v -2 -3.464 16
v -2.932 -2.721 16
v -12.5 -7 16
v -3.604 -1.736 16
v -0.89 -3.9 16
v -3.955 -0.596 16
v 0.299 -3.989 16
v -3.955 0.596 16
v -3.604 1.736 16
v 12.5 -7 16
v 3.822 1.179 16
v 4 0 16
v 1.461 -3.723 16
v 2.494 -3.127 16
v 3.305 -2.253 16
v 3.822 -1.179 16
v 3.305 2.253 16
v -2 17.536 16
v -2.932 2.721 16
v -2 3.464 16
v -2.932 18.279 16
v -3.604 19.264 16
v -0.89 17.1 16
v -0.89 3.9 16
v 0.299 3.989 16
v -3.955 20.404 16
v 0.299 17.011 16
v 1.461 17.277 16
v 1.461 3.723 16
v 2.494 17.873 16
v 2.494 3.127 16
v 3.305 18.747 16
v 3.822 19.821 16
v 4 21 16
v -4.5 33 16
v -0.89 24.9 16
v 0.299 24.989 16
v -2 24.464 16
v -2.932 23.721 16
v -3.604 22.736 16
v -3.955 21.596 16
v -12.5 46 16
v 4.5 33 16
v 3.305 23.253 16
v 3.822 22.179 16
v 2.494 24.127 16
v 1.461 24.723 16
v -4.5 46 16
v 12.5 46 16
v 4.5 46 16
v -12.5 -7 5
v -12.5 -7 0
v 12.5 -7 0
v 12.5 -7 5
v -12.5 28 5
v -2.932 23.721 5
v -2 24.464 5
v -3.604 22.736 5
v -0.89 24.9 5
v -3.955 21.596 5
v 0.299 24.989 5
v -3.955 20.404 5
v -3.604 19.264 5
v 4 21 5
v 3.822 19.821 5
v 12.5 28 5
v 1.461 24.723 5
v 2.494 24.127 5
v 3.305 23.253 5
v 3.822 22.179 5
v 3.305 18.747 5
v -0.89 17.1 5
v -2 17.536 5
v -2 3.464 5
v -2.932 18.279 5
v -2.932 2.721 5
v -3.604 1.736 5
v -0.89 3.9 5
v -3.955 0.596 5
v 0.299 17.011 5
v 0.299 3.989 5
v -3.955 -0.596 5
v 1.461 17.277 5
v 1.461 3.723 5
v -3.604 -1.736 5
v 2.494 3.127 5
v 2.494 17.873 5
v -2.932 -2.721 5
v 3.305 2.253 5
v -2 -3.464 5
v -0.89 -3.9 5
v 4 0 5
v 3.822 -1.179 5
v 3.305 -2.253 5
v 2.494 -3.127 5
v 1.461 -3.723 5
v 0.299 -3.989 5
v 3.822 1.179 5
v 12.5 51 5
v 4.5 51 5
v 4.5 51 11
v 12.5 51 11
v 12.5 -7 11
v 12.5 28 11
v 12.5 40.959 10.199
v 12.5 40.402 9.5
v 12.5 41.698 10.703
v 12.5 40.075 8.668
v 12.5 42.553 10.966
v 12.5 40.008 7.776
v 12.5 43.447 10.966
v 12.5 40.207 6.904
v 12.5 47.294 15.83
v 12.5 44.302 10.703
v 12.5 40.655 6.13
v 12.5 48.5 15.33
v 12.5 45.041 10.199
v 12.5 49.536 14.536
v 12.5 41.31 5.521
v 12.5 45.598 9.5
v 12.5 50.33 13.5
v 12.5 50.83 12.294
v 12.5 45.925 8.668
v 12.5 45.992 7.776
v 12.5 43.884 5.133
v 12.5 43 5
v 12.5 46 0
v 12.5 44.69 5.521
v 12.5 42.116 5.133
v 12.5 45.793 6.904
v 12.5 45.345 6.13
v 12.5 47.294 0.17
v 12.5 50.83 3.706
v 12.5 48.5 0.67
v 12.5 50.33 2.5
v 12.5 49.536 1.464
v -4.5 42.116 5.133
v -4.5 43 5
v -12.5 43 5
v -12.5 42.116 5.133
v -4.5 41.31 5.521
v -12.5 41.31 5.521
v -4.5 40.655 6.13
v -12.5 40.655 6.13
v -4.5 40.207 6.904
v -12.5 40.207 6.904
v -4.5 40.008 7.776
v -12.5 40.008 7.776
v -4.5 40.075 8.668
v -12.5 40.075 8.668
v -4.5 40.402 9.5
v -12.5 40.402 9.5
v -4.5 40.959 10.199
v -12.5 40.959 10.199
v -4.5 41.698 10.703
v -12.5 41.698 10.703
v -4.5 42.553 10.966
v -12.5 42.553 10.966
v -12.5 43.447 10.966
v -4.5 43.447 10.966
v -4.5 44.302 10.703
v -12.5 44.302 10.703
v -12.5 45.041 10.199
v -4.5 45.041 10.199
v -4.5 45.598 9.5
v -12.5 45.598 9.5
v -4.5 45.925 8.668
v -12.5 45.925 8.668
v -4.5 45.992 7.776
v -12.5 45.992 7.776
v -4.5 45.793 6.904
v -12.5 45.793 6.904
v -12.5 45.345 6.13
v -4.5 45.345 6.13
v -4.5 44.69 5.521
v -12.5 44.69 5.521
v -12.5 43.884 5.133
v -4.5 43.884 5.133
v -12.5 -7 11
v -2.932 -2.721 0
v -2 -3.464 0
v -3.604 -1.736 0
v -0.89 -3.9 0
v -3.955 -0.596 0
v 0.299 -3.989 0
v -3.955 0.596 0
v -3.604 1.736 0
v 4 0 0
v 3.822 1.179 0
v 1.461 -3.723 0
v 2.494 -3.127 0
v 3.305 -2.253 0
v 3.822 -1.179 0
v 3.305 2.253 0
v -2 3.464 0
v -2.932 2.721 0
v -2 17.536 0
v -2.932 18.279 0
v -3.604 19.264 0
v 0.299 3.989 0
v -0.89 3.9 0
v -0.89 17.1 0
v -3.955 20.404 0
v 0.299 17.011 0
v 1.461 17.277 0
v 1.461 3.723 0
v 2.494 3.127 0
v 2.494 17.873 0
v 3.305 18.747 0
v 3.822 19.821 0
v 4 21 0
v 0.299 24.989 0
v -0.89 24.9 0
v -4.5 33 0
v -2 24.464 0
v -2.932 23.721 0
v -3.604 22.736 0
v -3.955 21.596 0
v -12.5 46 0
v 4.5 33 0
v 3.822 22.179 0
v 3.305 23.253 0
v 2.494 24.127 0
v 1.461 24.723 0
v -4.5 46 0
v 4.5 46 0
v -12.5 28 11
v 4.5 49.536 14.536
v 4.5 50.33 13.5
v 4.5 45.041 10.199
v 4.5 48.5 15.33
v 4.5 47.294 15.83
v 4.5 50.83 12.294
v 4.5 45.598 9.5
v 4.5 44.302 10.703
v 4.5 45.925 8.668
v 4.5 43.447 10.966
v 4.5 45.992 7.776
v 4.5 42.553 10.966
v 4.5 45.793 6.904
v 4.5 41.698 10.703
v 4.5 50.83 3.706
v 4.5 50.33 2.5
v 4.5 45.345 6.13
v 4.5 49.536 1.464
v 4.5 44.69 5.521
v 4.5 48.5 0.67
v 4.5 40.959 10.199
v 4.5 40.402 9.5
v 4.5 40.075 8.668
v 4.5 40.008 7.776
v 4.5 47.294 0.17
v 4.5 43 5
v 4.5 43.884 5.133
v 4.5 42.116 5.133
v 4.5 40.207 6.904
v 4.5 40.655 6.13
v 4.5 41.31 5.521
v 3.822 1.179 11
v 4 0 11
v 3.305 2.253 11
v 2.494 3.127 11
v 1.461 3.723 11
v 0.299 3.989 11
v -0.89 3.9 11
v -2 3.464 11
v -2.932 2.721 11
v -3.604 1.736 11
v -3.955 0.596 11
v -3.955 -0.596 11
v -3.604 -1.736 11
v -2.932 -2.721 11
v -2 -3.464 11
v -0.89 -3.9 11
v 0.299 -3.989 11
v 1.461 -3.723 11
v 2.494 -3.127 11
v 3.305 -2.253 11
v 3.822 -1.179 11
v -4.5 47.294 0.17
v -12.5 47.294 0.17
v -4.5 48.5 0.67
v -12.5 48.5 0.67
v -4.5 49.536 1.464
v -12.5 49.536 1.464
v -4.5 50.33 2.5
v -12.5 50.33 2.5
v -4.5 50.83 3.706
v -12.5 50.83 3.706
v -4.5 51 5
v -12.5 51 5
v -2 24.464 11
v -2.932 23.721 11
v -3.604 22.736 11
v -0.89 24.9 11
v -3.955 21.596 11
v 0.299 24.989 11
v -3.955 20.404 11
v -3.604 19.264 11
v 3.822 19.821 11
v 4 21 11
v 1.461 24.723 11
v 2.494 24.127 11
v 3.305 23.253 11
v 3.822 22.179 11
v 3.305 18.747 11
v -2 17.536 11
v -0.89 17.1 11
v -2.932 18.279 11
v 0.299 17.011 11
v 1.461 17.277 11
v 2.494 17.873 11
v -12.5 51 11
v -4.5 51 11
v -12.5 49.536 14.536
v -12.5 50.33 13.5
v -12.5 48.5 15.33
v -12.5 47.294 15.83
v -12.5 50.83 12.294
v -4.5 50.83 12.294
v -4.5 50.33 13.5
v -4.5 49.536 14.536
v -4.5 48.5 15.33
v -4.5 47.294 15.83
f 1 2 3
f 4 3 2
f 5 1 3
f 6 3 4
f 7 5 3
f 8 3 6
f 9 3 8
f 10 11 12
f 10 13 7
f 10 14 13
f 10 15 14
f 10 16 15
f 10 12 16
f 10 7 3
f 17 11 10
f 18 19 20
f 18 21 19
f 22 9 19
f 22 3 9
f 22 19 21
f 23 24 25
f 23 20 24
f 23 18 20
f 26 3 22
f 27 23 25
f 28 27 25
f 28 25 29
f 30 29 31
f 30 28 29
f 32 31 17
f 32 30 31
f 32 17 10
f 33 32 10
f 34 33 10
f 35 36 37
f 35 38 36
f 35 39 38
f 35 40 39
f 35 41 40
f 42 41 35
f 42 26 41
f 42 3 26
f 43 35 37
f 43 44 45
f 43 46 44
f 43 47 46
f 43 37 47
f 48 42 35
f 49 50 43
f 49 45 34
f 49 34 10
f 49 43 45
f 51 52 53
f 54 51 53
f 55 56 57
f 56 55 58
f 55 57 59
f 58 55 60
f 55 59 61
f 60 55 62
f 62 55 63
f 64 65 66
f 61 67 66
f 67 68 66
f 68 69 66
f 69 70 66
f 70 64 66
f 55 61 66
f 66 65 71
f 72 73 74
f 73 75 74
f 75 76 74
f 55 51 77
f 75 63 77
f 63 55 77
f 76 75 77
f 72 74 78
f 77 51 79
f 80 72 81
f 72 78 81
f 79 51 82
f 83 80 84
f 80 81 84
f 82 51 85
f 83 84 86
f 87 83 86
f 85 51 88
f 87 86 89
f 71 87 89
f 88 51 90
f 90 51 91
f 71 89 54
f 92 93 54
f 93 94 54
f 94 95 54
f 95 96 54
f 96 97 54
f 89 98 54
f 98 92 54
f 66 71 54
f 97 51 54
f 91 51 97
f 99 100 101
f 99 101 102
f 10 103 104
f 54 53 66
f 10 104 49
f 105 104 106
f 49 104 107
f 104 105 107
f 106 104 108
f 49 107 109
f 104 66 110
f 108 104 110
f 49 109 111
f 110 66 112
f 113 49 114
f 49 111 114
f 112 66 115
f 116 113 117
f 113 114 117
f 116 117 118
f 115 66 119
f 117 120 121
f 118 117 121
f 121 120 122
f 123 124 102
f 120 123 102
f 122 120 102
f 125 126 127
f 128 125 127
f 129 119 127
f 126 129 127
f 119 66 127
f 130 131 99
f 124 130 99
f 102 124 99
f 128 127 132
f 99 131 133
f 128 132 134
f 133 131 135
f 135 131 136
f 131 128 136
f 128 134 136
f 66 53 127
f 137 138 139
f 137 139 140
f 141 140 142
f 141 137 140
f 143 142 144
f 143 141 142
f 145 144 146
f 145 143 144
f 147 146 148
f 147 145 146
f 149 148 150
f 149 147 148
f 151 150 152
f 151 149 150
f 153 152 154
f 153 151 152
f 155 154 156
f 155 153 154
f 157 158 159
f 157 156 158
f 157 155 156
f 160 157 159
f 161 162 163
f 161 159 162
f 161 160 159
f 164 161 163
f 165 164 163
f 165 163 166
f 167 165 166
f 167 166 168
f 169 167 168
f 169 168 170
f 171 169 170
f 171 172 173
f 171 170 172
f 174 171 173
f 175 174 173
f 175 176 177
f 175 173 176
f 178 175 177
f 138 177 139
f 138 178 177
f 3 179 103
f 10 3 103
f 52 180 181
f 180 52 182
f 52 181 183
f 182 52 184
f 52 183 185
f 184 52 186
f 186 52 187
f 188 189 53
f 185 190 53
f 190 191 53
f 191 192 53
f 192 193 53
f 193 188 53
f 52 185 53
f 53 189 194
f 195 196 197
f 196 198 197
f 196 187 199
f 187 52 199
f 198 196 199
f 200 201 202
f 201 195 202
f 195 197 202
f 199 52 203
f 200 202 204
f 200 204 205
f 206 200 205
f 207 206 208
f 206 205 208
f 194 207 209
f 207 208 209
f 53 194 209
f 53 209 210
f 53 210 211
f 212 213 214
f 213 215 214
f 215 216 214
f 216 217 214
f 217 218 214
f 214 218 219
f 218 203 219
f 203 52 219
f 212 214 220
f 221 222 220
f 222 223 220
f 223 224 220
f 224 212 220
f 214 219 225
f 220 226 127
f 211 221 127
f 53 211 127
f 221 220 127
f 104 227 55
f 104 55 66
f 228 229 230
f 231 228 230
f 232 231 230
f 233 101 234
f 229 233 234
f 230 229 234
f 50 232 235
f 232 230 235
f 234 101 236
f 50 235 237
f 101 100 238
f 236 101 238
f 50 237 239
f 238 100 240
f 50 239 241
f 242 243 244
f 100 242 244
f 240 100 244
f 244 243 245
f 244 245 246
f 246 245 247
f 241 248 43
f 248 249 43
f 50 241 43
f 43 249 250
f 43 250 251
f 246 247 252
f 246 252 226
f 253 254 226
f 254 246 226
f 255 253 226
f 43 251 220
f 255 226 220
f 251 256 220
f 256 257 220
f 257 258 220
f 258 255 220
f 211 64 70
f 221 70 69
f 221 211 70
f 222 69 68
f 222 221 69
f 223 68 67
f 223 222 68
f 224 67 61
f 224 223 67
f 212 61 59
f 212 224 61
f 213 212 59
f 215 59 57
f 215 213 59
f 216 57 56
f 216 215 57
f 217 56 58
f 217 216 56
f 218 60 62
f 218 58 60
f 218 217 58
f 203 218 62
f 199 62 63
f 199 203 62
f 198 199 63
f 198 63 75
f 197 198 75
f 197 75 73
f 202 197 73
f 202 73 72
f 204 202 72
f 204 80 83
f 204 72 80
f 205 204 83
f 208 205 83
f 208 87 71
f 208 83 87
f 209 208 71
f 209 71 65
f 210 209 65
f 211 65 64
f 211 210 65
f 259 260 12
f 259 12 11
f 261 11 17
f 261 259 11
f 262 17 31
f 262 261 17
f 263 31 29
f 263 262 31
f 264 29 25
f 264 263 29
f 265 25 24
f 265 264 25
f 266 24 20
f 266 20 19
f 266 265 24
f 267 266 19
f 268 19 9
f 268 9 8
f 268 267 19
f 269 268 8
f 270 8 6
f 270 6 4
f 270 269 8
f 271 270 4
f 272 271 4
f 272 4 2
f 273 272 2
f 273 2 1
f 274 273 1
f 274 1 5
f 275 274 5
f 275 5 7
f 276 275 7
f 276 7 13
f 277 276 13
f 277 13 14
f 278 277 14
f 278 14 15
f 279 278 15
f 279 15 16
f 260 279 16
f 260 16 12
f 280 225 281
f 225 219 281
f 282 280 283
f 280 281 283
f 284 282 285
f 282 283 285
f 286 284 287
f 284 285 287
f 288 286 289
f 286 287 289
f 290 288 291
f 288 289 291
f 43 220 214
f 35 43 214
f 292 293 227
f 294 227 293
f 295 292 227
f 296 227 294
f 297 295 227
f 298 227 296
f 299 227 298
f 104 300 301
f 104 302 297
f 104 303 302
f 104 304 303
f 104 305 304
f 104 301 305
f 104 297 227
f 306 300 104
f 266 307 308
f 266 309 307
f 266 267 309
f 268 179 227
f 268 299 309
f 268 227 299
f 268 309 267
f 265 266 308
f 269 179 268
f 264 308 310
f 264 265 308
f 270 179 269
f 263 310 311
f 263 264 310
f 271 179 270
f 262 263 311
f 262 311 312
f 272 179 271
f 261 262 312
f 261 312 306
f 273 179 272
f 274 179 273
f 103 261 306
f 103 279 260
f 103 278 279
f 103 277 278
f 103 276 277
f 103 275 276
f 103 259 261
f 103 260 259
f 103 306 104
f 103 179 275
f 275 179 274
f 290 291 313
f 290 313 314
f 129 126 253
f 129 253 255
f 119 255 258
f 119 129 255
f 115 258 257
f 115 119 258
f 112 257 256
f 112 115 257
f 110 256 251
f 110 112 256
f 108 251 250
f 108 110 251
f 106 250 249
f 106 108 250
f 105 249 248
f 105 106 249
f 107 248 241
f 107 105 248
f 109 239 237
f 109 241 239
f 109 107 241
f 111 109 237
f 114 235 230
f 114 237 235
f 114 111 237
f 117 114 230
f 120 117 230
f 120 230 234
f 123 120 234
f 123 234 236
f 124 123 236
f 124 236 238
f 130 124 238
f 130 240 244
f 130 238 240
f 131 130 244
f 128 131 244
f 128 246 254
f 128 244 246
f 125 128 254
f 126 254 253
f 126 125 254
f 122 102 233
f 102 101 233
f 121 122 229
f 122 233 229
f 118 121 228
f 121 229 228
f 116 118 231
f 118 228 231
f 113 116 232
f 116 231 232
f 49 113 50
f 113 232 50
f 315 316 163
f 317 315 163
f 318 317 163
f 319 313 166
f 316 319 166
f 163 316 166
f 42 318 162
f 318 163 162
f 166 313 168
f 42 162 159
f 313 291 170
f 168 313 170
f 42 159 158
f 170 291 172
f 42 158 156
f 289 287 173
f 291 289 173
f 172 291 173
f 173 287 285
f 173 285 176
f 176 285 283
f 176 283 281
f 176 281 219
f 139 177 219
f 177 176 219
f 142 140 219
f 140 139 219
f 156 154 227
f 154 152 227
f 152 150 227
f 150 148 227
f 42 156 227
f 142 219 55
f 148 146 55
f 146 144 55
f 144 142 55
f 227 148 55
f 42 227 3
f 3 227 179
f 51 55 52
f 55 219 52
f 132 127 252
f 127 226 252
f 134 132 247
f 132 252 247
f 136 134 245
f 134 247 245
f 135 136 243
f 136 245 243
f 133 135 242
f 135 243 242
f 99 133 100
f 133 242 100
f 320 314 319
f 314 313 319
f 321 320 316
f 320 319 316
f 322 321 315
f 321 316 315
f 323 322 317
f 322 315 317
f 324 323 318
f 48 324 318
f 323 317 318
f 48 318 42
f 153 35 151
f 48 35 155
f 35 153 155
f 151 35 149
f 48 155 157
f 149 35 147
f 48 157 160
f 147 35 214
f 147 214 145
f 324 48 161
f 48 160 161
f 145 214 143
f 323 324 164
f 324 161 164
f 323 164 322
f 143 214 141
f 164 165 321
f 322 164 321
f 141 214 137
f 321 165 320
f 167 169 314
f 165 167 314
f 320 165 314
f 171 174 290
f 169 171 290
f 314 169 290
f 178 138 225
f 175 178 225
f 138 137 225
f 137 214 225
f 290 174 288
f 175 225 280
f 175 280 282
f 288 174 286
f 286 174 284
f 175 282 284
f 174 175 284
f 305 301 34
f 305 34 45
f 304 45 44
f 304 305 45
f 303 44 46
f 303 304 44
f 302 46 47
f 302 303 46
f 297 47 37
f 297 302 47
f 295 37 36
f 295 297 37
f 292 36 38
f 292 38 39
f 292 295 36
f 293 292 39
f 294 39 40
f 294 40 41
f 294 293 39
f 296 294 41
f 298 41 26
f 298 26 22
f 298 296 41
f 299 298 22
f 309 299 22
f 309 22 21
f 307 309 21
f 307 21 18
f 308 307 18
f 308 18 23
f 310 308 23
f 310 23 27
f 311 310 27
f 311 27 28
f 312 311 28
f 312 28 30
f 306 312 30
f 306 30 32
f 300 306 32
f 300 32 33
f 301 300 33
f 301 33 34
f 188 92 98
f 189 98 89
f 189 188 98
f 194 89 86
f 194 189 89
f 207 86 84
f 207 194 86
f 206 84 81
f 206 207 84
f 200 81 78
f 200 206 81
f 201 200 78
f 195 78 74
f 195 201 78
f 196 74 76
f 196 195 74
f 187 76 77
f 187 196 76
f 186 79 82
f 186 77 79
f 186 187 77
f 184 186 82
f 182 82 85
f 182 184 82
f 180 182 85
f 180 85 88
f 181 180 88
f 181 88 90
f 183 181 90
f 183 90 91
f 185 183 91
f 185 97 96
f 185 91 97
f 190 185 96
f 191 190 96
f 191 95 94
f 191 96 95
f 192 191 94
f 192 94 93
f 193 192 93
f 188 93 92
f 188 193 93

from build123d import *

# Parameters (mm, degrees)
IZIM1_R                     = 4
Y_KSEKLIK_EKSTR_ZYON1_DEPTH = 16
IZIM2_W                     = 25
IZIM2_H                     = 6
KES_EKSTR_ZYON1_DEPTH       = 35
KES_EKSTR_ZYON2_DEPTH       = 36
KES_EKSTR_ZYON2_DEPTH_BACK  = 20
IZIM3_R                     = 3
SKETCH2_W                   = 46.387108154
SKETCH2_H                   = 28.761742624
CUT_EXTRUDE1_DEPTH          = 2
FILLET1_R                   = 5


with BuildPart() as part:
    # Çizim1 → Yükseklik-Ekstrüzyon1 (new body)
    with BuildSketch(Plane.XY):
        Polygon((-12.5, 28), (-12.5, -7), (12.5, -7), (12.5, 28), (12.5, 53), (6, 53), (4.5, 53), (4.5, 33), (-4.5, 33), (-4.5, 53), (-6, 53), (-12.5, 53), align=None)
        with Locations((0, 21)):
            Circle(IZIM1_R, mode=Mode.SUBTRACT)
        Circle(IZIM1_R, mode=Mode.SUBTRACT)
    extrude(amount=Y_KSEKLIK_EKSTR_ZYON1_DEPTH)

    # Çizim2 → Kes-Ekstrüzyon1 (cut)
    with BuildSketch(Plane.XZ.offset(7)):
        with Locations((0, 8)):
            Rectangle(IZIM2_W, IZIM2_H)
    extrude(amount=-KES_EKSTR_ZYON1_DEPTH, mode=Mode.SUBTRACT)

    # Çizim3 → Kes-Ekstrüzyon2 (cut, two sides: drawn at the far end of the back side and taken through both)
    with BuildSketch(Plane.ZY.offset(-4.5).offset(-KES_EKSTR_ZYON2_DEPTH_BACK)):
        with Locations(Location((8, 43, 0), (0, 0, 180))):
            Circle(IZIM3_R)
    extrude(amount=KES_EKSTR_ZYON2_DEPTH + KES_EKSTR_ZYON2_DEPTH_BACK, mode=Mode.SUBTRACT)

    # Sketch2 → Cut-Extrude1 (cut)
    with BuildSketch(Plane(origin=(0, 53, 0), x_dir=(1, 0, 0), z_dir=(0, 1, 0))):
        with Locations((-0.016890664, -9.346912489)):
            Rectangle(SKETCH2_W, SKETCH2_H)
    extrude(amount=-CUT_EXTRUDE1_DEPTH, mode=Mode.SUBTRACT)

    # Fillet1
    fillet1_edges = [part.edges().sort_by_distance(p)[0] for p in [
        (8.5, 51, 16),
        (-8.5, 51, 16),
        (8.5, 51, 0),
        (-8.5, 51, 0),
    ]]
    fillet(fillet1_edges, radius=FILLET1_R)


solid = part.part
